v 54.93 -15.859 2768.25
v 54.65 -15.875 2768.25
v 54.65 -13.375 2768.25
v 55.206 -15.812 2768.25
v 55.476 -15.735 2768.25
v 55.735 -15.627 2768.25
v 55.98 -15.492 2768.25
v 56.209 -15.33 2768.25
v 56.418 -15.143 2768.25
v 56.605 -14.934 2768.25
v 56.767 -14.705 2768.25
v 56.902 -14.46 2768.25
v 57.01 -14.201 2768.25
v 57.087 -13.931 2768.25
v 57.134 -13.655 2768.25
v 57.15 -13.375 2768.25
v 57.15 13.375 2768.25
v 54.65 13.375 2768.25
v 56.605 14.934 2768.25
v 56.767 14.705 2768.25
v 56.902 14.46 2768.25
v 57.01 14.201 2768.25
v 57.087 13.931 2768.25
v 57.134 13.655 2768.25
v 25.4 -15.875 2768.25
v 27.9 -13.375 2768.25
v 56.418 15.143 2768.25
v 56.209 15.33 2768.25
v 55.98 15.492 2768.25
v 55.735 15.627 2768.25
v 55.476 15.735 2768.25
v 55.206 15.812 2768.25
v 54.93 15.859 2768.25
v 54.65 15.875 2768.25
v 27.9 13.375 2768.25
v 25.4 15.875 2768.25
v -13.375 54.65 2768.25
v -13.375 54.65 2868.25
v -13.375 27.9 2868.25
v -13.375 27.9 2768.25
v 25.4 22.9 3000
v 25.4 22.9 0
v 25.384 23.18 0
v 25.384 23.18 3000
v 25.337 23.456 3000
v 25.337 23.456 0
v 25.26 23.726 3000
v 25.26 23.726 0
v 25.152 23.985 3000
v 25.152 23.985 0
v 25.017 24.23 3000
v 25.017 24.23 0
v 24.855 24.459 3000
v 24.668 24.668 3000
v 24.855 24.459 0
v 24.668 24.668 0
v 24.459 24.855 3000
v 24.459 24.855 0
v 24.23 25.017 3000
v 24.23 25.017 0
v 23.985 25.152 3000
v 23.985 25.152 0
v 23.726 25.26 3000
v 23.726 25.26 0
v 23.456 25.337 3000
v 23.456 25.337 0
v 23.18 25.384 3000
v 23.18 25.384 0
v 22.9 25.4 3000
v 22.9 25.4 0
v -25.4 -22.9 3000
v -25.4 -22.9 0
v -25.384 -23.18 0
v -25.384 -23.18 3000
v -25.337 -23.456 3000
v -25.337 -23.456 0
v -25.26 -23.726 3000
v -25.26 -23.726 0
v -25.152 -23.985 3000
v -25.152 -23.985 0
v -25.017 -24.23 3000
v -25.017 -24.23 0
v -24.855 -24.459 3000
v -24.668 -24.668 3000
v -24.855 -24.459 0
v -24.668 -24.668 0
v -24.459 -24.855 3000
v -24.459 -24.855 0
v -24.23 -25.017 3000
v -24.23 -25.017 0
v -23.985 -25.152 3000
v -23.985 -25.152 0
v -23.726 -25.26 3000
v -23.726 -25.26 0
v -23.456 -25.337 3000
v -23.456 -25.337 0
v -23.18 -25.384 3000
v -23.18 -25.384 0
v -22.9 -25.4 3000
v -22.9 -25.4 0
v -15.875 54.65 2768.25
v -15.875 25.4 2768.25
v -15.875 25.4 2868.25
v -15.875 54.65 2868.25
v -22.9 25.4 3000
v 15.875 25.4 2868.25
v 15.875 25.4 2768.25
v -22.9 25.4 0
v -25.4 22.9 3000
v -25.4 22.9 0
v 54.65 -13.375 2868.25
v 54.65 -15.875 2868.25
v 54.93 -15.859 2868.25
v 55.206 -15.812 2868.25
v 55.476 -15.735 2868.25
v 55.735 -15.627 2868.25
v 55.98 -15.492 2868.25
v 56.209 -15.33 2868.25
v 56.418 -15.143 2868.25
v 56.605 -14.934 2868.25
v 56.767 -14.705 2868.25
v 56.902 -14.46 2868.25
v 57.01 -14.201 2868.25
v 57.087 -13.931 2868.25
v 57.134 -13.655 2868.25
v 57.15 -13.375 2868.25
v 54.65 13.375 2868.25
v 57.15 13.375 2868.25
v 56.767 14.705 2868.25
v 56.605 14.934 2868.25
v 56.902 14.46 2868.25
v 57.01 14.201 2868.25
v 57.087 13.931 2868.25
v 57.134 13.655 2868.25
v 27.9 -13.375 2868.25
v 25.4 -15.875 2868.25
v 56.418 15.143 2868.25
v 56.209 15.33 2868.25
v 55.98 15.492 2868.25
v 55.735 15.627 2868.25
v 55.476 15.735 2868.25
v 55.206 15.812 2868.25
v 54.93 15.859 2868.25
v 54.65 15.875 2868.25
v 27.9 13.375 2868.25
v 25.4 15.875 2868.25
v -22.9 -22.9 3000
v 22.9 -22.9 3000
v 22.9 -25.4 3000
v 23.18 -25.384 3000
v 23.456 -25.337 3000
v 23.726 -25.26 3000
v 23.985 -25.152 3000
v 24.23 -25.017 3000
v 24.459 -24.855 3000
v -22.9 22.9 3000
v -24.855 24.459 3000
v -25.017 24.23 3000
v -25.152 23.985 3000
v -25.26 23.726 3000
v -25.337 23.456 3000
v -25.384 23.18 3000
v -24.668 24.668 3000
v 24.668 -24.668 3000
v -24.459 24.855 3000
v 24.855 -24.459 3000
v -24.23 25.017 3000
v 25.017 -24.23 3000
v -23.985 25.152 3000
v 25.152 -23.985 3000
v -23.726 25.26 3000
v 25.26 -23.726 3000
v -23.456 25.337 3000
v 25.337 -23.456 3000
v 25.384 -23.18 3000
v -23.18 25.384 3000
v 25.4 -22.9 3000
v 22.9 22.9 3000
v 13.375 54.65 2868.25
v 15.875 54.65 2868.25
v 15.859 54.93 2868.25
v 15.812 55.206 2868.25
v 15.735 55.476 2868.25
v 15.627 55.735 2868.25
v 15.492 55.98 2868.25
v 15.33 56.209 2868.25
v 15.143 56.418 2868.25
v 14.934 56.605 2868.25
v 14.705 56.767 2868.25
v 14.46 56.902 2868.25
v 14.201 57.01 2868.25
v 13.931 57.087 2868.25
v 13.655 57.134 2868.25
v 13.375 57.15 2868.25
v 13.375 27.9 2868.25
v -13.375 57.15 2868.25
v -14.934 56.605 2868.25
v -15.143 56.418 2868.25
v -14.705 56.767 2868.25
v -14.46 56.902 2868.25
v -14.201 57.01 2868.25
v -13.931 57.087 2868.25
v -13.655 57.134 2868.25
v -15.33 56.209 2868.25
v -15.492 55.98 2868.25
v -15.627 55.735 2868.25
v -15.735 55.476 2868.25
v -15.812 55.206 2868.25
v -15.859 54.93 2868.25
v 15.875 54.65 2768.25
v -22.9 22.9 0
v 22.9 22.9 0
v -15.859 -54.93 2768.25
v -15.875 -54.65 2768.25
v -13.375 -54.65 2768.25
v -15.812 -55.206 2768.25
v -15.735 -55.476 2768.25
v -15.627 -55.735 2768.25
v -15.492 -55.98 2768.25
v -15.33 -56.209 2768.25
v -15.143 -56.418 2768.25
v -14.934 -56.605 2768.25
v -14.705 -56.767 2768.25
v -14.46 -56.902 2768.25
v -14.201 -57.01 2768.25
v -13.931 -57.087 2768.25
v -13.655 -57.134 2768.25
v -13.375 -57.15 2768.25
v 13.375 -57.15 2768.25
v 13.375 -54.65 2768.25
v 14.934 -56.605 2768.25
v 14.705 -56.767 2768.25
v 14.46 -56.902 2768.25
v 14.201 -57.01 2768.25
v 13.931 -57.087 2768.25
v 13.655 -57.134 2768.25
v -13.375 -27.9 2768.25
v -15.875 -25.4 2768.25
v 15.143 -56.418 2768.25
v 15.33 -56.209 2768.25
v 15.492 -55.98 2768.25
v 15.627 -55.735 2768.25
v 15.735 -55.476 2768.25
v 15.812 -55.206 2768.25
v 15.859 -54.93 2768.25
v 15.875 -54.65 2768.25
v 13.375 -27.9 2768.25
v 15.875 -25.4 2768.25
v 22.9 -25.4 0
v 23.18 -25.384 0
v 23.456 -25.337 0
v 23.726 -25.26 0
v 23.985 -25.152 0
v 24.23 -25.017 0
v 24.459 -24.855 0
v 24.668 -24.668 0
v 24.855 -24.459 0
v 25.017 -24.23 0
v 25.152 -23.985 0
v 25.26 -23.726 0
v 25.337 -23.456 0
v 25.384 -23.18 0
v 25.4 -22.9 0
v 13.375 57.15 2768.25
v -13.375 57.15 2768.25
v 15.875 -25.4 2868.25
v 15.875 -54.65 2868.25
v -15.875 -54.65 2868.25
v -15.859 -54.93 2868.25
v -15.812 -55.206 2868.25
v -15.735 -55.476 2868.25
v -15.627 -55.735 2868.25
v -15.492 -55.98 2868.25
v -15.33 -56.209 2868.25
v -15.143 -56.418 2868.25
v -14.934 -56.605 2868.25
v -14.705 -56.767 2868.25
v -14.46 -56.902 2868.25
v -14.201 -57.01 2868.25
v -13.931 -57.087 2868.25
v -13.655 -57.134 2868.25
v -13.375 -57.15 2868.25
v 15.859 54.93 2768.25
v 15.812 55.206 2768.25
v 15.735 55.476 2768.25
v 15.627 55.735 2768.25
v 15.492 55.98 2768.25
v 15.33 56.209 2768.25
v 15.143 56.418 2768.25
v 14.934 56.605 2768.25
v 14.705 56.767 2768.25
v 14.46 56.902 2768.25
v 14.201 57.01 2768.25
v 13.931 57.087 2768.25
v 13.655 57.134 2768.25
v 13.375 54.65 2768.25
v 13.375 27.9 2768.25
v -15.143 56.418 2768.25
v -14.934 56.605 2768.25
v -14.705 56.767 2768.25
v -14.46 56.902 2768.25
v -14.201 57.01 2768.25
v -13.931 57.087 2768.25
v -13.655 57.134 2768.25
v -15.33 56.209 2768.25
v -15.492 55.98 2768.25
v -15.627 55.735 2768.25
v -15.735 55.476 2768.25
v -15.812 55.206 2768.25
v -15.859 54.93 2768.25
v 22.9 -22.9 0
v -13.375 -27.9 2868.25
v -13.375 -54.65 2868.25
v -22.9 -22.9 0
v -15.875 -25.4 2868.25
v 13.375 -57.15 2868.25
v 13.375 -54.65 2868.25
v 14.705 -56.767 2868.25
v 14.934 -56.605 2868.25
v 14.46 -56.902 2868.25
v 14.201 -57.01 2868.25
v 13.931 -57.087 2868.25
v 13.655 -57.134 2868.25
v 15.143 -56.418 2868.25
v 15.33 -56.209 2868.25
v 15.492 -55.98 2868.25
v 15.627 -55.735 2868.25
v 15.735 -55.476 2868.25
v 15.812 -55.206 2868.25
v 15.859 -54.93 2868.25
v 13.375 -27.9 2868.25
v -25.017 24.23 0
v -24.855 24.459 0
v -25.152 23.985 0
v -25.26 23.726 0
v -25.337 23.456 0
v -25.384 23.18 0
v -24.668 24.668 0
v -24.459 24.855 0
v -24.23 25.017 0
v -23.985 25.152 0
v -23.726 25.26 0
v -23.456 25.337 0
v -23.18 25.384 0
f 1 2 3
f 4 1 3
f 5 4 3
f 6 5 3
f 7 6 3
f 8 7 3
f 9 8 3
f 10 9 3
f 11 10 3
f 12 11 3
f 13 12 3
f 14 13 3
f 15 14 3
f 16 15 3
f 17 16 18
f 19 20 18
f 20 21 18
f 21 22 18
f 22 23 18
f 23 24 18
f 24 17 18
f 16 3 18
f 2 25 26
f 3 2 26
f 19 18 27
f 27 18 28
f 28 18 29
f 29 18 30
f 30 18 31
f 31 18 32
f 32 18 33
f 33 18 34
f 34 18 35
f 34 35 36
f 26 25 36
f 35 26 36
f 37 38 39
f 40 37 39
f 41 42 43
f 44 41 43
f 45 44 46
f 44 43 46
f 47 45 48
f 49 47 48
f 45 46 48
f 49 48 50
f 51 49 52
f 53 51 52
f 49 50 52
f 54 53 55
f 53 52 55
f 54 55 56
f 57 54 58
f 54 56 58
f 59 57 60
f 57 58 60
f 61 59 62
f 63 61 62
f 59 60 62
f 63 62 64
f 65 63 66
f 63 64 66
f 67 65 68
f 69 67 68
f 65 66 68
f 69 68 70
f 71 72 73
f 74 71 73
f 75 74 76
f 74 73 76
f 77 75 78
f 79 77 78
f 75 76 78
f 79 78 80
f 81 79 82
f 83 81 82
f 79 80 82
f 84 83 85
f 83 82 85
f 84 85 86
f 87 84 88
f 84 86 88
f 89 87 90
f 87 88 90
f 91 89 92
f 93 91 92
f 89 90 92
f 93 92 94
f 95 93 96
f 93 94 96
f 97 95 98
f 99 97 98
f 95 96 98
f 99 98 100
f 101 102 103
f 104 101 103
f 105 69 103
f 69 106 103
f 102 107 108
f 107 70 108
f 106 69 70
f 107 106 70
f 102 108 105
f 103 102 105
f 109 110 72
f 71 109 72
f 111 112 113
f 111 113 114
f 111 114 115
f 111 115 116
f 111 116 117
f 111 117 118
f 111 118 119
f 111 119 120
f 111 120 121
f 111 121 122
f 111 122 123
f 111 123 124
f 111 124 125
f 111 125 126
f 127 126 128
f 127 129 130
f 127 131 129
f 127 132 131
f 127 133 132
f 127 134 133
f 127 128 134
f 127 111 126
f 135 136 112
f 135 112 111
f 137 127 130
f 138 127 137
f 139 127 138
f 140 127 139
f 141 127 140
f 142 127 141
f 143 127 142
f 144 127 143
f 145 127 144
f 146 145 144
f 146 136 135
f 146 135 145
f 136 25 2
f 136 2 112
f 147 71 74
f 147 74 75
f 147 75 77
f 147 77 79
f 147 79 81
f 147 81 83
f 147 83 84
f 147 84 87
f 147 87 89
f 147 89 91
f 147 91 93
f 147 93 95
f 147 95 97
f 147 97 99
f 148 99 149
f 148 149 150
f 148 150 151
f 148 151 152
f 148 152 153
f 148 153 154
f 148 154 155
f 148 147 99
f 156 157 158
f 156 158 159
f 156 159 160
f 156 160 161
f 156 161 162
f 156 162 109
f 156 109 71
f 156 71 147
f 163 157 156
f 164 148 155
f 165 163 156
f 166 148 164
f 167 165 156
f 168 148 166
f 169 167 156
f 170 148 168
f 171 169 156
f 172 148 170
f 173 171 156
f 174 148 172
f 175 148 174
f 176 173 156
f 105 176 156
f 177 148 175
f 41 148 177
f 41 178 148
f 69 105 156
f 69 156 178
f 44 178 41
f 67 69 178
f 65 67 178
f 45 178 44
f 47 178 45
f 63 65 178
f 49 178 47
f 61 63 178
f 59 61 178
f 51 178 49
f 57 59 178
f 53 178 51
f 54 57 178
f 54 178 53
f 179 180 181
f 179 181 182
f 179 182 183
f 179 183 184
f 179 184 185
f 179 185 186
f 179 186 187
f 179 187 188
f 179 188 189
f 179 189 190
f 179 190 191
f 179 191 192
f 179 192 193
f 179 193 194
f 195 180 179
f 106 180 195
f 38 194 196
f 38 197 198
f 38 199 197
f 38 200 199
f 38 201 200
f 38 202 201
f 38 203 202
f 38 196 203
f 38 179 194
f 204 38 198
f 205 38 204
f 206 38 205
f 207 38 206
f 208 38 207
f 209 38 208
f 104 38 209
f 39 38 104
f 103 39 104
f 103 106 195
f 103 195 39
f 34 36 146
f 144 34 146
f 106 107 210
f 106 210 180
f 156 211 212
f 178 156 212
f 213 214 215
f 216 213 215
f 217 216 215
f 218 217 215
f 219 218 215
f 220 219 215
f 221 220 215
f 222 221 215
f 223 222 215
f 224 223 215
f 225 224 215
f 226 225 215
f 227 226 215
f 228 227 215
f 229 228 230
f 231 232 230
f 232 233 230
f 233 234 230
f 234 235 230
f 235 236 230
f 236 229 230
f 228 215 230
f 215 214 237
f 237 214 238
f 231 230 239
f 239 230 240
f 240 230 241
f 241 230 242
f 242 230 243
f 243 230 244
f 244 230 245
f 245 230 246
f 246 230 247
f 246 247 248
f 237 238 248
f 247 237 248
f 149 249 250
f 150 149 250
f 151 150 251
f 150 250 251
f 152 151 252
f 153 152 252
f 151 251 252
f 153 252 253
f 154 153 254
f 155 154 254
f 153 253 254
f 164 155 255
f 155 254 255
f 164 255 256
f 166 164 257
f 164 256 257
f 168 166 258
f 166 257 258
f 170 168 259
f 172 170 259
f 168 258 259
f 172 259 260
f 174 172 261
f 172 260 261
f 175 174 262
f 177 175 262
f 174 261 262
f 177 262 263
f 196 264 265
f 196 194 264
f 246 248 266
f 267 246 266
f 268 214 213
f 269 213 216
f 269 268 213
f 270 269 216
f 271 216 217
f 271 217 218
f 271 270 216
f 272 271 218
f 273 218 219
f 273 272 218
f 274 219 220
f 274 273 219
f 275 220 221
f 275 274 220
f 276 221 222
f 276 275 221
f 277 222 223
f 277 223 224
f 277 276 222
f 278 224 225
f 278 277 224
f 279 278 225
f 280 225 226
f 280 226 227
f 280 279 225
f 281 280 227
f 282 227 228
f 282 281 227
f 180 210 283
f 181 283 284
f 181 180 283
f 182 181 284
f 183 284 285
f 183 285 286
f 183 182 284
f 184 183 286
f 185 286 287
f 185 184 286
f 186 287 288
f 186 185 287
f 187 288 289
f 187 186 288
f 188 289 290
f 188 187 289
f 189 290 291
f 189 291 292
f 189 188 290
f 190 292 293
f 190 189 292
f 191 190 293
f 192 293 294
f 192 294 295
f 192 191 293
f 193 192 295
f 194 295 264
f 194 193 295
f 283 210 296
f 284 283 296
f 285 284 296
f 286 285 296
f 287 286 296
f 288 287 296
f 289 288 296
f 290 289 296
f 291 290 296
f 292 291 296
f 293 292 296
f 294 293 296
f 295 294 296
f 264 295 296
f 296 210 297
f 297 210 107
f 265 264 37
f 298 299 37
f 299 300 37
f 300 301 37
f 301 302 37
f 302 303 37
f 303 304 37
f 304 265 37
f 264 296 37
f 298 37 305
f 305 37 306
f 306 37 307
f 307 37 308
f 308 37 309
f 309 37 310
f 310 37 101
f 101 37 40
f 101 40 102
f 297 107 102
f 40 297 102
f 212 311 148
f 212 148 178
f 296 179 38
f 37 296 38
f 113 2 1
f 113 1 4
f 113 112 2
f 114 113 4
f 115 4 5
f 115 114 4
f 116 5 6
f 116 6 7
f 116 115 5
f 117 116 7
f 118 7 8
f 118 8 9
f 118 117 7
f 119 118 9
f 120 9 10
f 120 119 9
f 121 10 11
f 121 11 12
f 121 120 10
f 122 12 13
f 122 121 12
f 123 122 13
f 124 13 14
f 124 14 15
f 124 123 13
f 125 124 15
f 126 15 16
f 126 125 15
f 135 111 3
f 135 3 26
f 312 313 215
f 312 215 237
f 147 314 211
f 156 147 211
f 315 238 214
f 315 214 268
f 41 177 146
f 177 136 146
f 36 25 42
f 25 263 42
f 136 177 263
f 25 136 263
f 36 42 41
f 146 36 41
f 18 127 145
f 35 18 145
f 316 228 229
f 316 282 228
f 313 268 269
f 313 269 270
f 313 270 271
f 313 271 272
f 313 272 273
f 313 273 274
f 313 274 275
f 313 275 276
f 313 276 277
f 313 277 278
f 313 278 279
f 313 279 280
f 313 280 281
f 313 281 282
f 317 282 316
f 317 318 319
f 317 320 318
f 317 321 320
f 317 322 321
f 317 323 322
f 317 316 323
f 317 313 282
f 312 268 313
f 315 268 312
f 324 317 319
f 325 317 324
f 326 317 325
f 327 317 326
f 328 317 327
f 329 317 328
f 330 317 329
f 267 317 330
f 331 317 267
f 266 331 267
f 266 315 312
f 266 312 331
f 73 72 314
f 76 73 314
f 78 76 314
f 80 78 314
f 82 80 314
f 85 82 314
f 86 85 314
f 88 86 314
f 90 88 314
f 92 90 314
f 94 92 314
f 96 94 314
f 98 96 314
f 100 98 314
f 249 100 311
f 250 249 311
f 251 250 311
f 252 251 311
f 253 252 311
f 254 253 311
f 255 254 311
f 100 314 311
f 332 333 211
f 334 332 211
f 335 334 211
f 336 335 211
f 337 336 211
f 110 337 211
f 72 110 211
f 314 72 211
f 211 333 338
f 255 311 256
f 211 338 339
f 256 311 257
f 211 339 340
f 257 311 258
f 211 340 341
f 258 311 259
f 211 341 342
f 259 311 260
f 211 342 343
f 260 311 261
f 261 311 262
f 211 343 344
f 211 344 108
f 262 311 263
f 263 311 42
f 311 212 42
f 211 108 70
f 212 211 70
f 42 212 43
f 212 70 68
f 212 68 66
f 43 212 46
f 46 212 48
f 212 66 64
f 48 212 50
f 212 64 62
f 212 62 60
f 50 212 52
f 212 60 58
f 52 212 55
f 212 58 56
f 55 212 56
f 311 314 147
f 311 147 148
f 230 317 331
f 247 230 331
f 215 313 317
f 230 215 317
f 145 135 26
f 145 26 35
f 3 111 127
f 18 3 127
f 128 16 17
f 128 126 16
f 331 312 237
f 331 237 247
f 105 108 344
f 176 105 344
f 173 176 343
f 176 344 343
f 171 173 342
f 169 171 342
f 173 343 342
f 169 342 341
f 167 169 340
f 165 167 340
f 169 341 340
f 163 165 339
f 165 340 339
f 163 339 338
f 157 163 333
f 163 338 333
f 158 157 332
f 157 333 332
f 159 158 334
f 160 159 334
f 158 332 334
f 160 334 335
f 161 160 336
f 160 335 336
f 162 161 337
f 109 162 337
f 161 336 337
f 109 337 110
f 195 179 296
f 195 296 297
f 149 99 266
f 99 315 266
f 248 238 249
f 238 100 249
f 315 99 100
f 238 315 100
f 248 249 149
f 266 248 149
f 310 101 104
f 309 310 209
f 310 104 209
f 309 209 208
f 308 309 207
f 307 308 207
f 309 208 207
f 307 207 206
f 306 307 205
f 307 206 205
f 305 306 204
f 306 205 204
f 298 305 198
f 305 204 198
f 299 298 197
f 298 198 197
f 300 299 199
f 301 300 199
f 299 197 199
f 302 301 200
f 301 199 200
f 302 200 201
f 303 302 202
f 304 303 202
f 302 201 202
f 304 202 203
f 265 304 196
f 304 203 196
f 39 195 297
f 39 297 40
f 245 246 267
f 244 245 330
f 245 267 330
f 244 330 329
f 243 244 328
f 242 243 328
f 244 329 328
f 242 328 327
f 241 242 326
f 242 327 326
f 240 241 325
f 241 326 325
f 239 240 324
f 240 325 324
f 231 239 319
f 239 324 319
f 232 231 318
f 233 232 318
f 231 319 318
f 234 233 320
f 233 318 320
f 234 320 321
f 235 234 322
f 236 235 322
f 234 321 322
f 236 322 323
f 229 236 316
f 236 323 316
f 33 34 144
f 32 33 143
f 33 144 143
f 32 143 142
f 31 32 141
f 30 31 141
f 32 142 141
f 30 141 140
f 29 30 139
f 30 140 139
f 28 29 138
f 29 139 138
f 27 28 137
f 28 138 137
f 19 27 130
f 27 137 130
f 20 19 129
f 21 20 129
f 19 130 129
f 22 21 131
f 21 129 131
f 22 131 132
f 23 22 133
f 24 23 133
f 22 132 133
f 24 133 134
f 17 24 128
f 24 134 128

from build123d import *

# Parameters (mm, degrees)
F0_W            = 45.8
F0_H            = 45.8
F1_DEPTH        = 3000
F2_W            = 31.75
F2_H            = 100
F3_DEPTH        = 31.75
F3_COPIES_COUNT = 3
F3_COPIES_ANGLE = 180
F4_R            = 2.5
F5_W            = 26.75
F5_H            = 26.75
F6_DEPTH        = 100
F6_COPIES_COUNT = 3
F6_COPIES_ANGLE = 180


# Not quite as in the source:
# - a pattern or mirror of a feature is missing from the dataset's text; its kind, count and spacing are read off the source's solid


with BuildPart() as f1:
    # F0 (on Top) → F1 (new body)
    with BuildSketch(Plane.XY):
        with BuildLine():
            ThreePointArc((25.4, 22.9), (24.667766953, 24.667766953), (22.9, 25.4))
            Line((22.9, 25.4), (-22.9, 25.4))
            ThreePointArc((-22.9, 25.4), (-24.667766953, 24.667766953), (-25.4, 22.9))
            Line((-25.4, 22.9), (-25.4, -22.9))
            ThreePointArc((-25.4, -22.9), (-24.667766953, -24.667766953), (-22.9, -25.4))
            Line((-22.9, -25.4), (22.9, -25.4))
            ThreePointArc((22.9, -25.4), (24.667766953, -24.667766953), (25.4, -22.9))
            Line((25.4, -22.9), (25.4, 22.9))
        make_face()
        Rectangle(F0_W, F0_H, mode=Mode.SUBTRACT)
    extrude(amount=F1_DEPTH)

    # F2 (on face) → F3 (join)
    with BuildSketch(Plane.XZ.offset(25.4)):
        with Locations((0, 2818.25)):
            Rectangle(F2_W, F2_H)
    f3 = extrude(amount=F3_DEPTH)

    # F3_copies: F3 ×3 about axis
    f3_copies_axis = Axis((0, 0, 0), (0, 0, 1))
    for i in range(1, F3_COPIES_COUNT):
        add(f3.rotate(f3_copies_axis, i * F3_COPIES_ANGLE / (F3_COPIES_COUNT - 1)))

    # F4
    f4_edges = [f1.edges().sort_by_distance(p)[0] for p in [
        (-15.875, -57.15, 2818.25),
        (15.875, -57.15, 2818.25),
        (57.15, -15.875, 2818.25),
        (57.15, 15.875, 2818.25),
        (15.875, 57.15, 2818.25),
        (-15.875, 57.15, 2818.25),
    ]]
    fillet(f4_edges, radius=F4_R)

    # F5 (on face) → F6 (cut, through all)
    with BuildSketch(Plane.XY.offset(2868.25)):
        with Locations((0, -41.275)):
            Rectangle(F5_W, F5_H)
    f6 = extrude(amount=-F6_DEPTH, mode=Mode.SUBTRACT)

    # F6_copies: F6 ×3 about axis
    f6_copies_axis = Axis((0, 0, 0), (0, 0, 1))
    for i in range(1, F6_COPIES_COUNT):
        add(f6.rotate(f6_copies_axis, i * F6_COPIES_ANGLE / (F6_COPIES_COUNT - 1)), mode=Mode.SUBTRACT)


solid = f1.part
